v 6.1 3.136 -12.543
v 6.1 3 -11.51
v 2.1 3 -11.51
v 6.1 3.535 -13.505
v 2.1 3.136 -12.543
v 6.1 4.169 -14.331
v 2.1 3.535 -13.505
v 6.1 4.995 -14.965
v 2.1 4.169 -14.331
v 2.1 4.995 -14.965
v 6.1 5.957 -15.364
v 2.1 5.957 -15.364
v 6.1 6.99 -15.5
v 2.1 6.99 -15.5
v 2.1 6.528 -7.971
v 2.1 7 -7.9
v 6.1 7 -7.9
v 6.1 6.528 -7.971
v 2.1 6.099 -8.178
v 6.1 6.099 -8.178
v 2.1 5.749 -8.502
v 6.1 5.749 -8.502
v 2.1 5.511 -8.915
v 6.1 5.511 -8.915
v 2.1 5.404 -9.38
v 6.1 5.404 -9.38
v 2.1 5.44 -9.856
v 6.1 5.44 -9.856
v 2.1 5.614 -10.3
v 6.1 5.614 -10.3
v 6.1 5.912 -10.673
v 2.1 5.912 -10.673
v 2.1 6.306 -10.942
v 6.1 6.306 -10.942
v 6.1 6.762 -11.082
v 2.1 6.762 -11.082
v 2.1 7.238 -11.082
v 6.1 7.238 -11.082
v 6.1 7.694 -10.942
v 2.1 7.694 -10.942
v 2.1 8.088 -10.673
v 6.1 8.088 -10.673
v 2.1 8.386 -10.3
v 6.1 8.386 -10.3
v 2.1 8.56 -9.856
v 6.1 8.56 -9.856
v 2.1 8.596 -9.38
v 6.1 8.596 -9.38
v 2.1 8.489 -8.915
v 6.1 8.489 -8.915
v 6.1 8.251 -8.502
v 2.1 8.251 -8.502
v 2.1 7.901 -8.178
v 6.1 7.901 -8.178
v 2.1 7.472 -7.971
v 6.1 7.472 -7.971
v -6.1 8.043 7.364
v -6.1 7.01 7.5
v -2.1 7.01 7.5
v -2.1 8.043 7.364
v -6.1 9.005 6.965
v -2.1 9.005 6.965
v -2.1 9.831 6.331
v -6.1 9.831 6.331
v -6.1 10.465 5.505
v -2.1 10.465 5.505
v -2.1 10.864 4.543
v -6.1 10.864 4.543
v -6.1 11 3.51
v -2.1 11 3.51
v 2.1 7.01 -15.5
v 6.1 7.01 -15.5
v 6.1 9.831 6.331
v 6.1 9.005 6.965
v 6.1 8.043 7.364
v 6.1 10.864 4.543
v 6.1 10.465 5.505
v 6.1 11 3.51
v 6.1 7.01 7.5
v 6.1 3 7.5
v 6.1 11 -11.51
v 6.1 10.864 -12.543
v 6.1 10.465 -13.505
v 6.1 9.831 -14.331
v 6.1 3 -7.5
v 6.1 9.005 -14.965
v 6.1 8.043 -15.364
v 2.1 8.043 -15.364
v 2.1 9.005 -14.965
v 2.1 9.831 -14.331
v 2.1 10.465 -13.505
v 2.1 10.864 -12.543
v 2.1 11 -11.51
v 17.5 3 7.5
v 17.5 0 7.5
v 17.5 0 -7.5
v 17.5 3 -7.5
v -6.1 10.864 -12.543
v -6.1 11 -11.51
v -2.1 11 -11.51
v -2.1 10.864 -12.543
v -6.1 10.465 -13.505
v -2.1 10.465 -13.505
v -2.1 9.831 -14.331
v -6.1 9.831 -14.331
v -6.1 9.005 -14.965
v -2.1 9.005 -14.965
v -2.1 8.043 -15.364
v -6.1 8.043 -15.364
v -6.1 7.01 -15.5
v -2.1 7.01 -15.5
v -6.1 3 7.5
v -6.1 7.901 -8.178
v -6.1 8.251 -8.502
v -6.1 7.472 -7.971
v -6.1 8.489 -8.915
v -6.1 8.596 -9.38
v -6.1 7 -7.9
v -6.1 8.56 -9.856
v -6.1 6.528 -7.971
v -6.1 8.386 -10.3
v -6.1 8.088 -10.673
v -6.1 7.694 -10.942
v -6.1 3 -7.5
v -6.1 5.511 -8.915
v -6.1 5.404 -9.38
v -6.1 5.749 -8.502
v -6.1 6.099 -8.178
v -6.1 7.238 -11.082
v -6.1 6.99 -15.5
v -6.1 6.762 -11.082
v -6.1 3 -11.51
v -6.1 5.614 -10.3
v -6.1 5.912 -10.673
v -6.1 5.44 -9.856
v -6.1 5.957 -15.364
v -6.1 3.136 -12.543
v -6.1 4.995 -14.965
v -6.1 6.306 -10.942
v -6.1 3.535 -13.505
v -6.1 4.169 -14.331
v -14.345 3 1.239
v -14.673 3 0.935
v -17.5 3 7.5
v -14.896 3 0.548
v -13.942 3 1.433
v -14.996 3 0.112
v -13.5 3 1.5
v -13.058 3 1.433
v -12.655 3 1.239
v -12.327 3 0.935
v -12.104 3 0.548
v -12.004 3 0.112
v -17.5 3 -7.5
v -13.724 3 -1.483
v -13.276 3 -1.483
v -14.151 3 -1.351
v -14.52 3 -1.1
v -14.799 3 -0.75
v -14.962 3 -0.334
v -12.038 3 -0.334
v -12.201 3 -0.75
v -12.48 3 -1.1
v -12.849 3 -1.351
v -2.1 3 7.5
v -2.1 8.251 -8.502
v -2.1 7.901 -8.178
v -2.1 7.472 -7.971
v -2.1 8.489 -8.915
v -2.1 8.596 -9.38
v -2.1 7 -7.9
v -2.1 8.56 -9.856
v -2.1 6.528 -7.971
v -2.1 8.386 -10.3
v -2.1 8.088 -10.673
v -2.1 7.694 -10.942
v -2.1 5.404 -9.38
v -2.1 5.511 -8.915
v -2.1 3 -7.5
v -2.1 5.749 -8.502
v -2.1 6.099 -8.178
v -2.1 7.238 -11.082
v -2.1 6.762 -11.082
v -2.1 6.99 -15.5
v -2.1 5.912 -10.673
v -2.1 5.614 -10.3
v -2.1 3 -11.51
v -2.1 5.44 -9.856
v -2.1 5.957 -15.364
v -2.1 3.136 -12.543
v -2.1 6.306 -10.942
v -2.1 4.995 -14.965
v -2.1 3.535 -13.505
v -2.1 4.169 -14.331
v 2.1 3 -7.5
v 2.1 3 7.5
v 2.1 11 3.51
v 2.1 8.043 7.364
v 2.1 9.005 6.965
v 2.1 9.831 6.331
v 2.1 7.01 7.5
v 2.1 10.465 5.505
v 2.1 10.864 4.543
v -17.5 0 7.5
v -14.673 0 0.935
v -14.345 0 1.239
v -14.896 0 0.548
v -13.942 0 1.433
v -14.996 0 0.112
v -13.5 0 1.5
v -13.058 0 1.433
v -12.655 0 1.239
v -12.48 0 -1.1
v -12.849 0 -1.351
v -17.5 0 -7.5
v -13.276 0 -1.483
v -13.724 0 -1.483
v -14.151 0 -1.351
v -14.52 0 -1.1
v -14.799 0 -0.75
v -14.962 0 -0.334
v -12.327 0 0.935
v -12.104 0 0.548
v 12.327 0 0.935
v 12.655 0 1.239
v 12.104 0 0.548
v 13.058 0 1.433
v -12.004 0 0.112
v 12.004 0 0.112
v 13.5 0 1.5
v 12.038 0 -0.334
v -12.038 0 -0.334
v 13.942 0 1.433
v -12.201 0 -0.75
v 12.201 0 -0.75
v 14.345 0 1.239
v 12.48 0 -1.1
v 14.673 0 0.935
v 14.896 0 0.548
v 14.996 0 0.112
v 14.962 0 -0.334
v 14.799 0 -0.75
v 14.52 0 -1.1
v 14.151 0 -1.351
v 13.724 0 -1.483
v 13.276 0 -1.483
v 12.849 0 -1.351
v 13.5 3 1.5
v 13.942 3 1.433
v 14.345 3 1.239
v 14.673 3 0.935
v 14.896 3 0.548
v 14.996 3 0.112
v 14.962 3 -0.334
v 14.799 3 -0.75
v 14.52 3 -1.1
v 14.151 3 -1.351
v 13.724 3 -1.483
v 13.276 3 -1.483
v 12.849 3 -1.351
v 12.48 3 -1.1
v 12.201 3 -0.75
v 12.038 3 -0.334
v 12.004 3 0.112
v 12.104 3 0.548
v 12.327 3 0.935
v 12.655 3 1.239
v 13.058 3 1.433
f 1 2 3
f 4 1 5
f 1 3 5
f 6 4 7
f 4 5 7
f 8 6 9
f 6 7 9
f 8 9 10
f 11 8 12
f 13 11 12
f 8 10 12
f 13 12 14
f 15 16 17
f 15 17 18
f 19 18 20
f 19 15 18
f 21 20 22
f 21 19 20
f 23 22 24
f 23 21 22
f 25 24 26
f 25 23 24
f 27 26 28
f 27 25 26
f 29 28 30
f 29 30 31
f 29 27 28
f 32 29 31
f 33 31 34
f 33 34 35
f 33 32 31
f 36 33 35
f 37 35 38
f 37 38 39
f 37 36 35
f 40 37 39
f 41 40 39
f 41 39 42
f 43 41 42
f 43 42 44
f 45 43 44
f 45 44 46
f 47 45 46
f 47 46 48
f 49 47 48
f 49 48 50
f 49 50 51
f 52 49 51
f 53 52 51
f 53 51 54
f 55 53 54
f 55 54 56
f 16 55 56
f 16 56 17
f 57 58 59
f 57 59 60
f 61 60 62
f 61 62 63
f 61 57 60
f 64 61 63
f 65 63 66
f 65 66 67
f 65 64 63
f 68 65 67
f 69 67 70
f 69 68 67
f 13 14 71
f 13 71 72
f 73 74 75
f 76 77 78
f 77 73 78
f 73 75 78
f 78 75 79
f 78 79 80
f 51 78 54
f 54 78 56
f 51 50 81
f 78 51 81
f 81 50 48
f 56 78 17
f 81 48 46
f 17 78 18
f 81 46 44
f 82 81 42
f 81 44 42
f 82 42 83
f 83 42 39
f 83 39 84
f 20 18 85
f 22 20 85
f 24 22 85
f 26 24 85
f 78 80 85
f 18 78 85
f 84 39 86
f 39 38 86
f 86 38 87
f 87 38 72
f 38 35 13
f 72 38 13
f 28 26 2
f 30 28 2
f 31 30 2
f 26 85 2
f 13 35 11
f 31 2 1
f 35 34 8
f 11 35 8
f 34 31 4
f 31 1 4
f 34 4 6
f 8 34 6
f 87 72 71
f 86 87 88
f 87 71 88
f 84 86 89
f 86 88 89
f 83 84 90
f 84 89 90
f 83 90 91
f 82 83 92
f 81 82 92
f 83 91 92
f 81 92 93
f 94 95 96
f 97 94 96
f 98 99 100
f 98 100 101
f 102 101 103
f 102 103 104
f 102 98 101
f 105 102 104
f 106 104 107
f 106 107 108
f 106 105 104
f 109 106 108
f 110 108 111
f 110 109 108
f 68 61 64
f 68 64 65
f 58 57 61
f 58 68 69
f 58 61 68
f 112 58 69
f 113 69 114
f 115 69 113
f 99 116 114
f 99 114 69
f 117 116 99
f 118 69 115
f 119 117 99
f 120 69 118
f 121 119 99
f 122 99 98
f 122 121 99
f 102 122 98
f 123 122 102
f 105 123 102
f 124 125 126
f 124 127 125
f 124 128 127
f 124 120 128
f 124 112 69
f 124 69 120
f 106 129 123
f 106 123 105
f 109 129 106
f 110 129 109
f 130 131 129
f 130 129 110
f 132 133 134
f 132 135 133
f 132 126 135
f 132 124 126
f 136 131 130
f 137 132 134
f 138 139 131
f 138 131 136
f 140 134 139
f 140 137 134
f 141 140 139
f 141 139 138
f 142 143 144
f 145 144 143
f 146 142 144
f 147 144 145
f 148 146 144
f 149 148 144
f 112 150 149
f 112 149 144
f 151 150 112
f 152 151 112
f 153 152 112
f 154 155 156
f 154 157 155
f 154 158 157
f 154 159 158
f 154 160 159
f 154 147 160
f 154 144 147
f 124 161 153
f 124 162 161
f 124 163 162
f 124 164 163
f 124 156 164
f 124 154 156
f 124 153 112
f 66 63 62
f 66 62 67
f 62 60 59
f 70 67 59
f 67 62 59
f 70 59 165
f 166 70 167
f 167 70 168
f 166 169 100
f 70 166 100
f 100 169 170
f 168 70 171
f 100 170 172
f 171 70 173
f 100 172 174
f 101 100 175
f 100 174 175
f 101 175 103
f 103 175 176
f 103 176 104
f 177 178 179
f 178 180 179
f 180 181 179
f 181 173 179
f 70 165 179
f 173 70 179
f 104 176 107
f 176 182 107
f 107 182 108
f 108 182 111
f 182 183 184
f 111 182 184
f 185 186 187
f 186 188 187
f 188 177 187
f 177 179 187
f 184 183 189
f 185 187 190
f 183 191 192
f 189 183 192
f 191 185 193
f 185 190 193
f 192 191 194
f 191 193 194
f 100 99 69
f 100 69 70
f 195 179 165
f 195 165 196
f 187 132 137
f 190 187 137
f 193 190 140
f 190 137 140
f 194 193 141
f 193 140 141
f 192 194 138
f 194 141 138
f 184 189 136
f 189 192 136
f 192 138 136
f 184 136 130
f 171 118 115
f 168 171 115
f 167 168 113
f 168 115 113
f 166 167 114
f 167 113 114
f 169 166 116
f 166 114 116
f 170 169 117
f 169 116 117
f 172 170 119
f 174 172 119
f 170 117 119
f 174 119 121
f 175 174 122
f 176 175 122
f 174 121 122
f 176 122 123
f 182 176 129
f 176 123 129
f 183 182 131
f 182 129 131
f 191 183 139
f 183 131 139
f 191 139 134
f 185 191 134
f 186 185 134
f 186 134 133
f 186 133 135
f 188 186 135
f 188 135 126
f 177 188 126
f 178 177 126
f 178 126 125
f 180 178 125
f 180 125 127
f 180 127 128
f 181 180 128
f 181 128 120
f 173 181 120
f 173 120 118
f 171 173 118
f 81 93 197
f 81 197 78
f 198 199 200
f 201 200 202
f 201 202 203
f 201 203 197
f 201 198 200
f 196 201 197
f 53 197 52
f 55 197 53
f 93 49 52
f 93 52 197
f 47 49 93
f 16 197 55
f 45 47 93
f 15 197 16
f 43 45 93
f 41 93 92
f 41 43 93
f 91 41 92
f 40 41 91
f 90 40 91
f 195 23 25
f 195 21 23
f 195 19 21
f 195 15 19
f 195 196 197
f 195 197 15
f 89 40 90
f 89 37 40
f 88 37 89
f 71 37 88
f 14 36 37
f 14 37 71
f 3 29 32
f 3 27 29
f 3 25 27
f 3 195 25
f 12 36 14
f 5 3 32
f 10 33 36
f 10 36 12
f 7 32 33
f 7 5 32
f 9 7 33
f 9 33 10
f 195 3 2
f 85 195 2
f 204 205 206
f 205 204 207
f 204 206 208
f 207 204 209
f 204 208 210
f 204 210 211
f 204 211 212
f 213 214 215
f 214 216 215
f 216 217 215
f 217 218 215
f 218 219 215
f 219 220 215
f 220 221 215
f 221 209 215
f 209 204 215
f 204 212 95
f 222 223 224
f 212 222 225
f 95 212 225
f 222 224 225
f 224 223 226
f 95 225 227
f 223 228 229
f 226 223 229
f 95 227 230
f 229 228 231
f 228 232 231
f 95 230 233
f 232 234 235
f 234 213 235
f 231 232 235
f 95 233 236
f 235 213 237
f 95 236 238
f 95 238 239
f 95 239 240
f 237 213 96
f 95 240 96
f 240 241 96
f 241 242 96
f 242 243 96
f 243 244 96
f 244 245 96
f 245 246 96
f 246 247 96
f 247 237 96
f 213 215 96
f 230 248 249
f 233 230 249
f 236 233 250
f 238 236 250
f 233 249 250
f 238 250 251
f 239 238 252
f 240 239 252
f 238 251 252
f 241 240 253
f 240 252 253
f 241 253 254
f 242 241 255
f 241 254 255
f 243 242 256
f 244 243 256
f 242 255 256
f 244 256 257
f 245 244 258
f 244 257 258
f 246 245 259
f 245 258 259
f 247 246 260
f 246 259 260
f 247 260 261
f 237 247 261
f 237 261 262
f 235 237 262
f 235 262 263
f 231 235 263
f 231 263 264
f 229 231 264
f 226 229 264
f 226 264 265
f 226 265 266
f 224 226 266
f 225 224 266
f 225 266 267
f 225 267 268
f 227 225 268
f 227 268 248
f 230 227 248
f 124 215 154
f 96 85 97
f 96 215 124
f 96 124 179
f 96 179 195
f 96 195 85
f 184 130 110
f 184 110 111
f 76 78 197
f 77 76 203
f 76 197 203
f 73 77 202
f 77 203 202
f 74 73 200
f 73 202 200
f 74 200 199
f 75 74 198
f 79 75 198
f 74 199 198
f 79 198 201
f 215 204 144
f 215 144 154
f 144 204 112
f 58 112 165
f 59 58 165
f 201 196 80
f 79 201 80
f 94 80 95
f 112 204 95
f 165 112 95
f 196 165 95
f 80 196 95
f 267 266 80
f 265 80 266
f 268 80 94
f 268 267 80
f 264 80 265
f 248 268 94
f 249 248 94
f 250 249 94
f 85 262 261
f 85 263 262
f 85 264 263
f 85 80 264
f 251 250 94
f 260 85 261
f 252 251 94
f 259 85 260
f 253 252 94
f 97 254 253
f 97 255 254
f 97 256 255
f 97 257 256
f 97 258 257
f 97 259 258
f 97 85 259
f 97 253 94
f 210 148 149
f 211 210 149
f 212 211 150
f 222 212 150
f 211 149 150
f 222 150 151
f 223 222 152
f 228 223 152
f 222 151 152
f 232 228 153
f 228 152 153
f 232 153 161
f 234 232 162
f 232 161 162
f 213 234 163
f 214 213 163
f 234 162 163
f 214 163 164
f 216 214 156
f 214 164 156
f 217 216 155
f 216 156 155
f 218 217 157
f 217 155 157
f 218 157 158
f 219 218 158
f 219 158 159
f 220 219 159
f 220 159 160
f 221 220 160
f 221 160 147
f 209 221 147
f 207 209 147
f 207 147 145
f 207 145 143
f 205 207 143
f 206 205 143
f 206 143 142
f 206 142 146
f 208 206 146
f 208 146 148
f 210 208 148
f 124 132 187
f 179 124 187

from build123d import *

# Parameters (mm, degrees)
SKETCH1_W           = 35
SKETCH1_H           = 15
BOSS_EXTRUDE1_DEPTH = 3
SKETCH2_W           = 4
SKETCH2_H           = 23
BOSS_EXTRUDE2_DEPTH = 8
SKETCH3_R           = 1.6
CUT_EXTRUDE1_DEPTH  = 8
CUT_EXTRUDE2_START  = -8
SKETCH5_R           = 1.6
CUT_EXTRUDE2_DEPTH  = 8
SKETCH6_R           = 1.5
CUT_EXTRUDE3_DEPTH  = 8


with BuildPart() as part:
    # Sketch1 → Boss-Extrude1 (new body)
    with BuildSketch(Plane(origin=(0, 0, 0), x_dir=(1, 0, 0), z_dir=(0, 1, 0))):
        Rectangle(SKETCH1_W, SKETCH1_H)
    extrude(amount=BOSS_EXTRUDE1_DEPTH)

    # Sketch2 → Boss-Extrude2 (add)
    with BuildSketch(Plane(origin=(0, 3, 0), x_dir=(1, 0, 0), z_dir=(0, 1, 0))):
        with Locations((-4.1, 4)):
            Rectangle(SKETCH2_W, SKETCH2_H)
        with Locations((4.1, 4)):
            Rectangle(SKETCH2_W, SKETCH2_H)
    extrude(amount=BOSS_EXTRUDE2_DEPTH)

    # Sketch3 → Cut-Extrude1 (cut)
    with BuildSketch(Plane.ZY.offset(6.1)):
        with Locations((-9.5, 7)):
            Circle(SKETCH3_R)
        with BuildLine():
            Line((-15.5, 6.99), (-15.5, 3))
            Line((-15.5, 3), (-11.51, 3))
            ThreePointArc((-11.51, 3), (-14.331356057, 4.168643943), (-15.5, 6.99))
        make_face()
        with BuildLine():
            Line((-15.5, 7.01), (-15.5, 11))
            Line((-15.5, 11), (-11.51, 11))
            ThreePointArc((-11.51, 11), (-14.331356057, 9.831356057), (-15.5, 7.01))
        make_face()
        with BuildLine():
            Line((7.5, 11), (7.5, 7.01))
            ThreePointArc((7.5, 7.01), (6.331356057, 9.831356057), (3.51, 11))
            Line((3.51, 11), (7.5, 11))
        make_face()
    extrude(amount=-CUT_EXTRUDE1_DEPTH, mode=Mode.SUBTRACT)

    # Sketch5 → Cut-Extrude2 (cut)
    with BuildSketch(Plane(origin=(6.1, 0, 0), x_dir=(0, 0, -1), z_dir=(1, 0, 0)).offset(CUT_EXTRUDE2_START)):
        with Locations(Location((9.5, 7, 0), (0, 0, 180))):
            Circle(SKETCH5_R)
        with BuildLine():
            Line((11.51, 11), (15.5, 11))
            Line((15.5, 11), (15.5, 7.01))
            ThreePointArc((15.5, 7.01), (14.331356057, 9.831356057), (11.51, 11))
        make_face()
        with BuildLine():
            Line((15.5, 6.99), (15.5, 3))
            Line((15.5, 3), (11.51, 3))
            ThreePointArc((11.51, 3), (14.331356057, 4.168643943), (15.5, 6.99))
        make_face()
        with BuildLine():
            Line((-7.5, 7.01), (-7.5, 11))
            Line((-7.5, 11), (-3.51, 11))
            ThreePointArc((-3.51, 11), (-6.331356057, 9.831356057), (-7.5, 7.01))
        make_face()
    extrude(amount=CUT_EXTRUDE2_DEPTH, mode=Mode.SUBTRACT)

    # Sketch6 → Cut-Extrude3 (cut)
    with BuildSketch(Plane(origin=(0, 3, 0), x_dir=(1, 0, 0), z_dir=(0, 1, 0))):
        with Locations(Location((13.5, 0, 0), (0, 0, 270))):
            Circle(SKETCH6_R)
        with Locations(Location((-13.5, 0, 0), (0, 0, 270))):
            Circle(SKETCH6_R)
    extrude(amount=-CUT_EXTRUDE3_DEPTH, mode=Mode.SUBTRACT)


solid = part.part
